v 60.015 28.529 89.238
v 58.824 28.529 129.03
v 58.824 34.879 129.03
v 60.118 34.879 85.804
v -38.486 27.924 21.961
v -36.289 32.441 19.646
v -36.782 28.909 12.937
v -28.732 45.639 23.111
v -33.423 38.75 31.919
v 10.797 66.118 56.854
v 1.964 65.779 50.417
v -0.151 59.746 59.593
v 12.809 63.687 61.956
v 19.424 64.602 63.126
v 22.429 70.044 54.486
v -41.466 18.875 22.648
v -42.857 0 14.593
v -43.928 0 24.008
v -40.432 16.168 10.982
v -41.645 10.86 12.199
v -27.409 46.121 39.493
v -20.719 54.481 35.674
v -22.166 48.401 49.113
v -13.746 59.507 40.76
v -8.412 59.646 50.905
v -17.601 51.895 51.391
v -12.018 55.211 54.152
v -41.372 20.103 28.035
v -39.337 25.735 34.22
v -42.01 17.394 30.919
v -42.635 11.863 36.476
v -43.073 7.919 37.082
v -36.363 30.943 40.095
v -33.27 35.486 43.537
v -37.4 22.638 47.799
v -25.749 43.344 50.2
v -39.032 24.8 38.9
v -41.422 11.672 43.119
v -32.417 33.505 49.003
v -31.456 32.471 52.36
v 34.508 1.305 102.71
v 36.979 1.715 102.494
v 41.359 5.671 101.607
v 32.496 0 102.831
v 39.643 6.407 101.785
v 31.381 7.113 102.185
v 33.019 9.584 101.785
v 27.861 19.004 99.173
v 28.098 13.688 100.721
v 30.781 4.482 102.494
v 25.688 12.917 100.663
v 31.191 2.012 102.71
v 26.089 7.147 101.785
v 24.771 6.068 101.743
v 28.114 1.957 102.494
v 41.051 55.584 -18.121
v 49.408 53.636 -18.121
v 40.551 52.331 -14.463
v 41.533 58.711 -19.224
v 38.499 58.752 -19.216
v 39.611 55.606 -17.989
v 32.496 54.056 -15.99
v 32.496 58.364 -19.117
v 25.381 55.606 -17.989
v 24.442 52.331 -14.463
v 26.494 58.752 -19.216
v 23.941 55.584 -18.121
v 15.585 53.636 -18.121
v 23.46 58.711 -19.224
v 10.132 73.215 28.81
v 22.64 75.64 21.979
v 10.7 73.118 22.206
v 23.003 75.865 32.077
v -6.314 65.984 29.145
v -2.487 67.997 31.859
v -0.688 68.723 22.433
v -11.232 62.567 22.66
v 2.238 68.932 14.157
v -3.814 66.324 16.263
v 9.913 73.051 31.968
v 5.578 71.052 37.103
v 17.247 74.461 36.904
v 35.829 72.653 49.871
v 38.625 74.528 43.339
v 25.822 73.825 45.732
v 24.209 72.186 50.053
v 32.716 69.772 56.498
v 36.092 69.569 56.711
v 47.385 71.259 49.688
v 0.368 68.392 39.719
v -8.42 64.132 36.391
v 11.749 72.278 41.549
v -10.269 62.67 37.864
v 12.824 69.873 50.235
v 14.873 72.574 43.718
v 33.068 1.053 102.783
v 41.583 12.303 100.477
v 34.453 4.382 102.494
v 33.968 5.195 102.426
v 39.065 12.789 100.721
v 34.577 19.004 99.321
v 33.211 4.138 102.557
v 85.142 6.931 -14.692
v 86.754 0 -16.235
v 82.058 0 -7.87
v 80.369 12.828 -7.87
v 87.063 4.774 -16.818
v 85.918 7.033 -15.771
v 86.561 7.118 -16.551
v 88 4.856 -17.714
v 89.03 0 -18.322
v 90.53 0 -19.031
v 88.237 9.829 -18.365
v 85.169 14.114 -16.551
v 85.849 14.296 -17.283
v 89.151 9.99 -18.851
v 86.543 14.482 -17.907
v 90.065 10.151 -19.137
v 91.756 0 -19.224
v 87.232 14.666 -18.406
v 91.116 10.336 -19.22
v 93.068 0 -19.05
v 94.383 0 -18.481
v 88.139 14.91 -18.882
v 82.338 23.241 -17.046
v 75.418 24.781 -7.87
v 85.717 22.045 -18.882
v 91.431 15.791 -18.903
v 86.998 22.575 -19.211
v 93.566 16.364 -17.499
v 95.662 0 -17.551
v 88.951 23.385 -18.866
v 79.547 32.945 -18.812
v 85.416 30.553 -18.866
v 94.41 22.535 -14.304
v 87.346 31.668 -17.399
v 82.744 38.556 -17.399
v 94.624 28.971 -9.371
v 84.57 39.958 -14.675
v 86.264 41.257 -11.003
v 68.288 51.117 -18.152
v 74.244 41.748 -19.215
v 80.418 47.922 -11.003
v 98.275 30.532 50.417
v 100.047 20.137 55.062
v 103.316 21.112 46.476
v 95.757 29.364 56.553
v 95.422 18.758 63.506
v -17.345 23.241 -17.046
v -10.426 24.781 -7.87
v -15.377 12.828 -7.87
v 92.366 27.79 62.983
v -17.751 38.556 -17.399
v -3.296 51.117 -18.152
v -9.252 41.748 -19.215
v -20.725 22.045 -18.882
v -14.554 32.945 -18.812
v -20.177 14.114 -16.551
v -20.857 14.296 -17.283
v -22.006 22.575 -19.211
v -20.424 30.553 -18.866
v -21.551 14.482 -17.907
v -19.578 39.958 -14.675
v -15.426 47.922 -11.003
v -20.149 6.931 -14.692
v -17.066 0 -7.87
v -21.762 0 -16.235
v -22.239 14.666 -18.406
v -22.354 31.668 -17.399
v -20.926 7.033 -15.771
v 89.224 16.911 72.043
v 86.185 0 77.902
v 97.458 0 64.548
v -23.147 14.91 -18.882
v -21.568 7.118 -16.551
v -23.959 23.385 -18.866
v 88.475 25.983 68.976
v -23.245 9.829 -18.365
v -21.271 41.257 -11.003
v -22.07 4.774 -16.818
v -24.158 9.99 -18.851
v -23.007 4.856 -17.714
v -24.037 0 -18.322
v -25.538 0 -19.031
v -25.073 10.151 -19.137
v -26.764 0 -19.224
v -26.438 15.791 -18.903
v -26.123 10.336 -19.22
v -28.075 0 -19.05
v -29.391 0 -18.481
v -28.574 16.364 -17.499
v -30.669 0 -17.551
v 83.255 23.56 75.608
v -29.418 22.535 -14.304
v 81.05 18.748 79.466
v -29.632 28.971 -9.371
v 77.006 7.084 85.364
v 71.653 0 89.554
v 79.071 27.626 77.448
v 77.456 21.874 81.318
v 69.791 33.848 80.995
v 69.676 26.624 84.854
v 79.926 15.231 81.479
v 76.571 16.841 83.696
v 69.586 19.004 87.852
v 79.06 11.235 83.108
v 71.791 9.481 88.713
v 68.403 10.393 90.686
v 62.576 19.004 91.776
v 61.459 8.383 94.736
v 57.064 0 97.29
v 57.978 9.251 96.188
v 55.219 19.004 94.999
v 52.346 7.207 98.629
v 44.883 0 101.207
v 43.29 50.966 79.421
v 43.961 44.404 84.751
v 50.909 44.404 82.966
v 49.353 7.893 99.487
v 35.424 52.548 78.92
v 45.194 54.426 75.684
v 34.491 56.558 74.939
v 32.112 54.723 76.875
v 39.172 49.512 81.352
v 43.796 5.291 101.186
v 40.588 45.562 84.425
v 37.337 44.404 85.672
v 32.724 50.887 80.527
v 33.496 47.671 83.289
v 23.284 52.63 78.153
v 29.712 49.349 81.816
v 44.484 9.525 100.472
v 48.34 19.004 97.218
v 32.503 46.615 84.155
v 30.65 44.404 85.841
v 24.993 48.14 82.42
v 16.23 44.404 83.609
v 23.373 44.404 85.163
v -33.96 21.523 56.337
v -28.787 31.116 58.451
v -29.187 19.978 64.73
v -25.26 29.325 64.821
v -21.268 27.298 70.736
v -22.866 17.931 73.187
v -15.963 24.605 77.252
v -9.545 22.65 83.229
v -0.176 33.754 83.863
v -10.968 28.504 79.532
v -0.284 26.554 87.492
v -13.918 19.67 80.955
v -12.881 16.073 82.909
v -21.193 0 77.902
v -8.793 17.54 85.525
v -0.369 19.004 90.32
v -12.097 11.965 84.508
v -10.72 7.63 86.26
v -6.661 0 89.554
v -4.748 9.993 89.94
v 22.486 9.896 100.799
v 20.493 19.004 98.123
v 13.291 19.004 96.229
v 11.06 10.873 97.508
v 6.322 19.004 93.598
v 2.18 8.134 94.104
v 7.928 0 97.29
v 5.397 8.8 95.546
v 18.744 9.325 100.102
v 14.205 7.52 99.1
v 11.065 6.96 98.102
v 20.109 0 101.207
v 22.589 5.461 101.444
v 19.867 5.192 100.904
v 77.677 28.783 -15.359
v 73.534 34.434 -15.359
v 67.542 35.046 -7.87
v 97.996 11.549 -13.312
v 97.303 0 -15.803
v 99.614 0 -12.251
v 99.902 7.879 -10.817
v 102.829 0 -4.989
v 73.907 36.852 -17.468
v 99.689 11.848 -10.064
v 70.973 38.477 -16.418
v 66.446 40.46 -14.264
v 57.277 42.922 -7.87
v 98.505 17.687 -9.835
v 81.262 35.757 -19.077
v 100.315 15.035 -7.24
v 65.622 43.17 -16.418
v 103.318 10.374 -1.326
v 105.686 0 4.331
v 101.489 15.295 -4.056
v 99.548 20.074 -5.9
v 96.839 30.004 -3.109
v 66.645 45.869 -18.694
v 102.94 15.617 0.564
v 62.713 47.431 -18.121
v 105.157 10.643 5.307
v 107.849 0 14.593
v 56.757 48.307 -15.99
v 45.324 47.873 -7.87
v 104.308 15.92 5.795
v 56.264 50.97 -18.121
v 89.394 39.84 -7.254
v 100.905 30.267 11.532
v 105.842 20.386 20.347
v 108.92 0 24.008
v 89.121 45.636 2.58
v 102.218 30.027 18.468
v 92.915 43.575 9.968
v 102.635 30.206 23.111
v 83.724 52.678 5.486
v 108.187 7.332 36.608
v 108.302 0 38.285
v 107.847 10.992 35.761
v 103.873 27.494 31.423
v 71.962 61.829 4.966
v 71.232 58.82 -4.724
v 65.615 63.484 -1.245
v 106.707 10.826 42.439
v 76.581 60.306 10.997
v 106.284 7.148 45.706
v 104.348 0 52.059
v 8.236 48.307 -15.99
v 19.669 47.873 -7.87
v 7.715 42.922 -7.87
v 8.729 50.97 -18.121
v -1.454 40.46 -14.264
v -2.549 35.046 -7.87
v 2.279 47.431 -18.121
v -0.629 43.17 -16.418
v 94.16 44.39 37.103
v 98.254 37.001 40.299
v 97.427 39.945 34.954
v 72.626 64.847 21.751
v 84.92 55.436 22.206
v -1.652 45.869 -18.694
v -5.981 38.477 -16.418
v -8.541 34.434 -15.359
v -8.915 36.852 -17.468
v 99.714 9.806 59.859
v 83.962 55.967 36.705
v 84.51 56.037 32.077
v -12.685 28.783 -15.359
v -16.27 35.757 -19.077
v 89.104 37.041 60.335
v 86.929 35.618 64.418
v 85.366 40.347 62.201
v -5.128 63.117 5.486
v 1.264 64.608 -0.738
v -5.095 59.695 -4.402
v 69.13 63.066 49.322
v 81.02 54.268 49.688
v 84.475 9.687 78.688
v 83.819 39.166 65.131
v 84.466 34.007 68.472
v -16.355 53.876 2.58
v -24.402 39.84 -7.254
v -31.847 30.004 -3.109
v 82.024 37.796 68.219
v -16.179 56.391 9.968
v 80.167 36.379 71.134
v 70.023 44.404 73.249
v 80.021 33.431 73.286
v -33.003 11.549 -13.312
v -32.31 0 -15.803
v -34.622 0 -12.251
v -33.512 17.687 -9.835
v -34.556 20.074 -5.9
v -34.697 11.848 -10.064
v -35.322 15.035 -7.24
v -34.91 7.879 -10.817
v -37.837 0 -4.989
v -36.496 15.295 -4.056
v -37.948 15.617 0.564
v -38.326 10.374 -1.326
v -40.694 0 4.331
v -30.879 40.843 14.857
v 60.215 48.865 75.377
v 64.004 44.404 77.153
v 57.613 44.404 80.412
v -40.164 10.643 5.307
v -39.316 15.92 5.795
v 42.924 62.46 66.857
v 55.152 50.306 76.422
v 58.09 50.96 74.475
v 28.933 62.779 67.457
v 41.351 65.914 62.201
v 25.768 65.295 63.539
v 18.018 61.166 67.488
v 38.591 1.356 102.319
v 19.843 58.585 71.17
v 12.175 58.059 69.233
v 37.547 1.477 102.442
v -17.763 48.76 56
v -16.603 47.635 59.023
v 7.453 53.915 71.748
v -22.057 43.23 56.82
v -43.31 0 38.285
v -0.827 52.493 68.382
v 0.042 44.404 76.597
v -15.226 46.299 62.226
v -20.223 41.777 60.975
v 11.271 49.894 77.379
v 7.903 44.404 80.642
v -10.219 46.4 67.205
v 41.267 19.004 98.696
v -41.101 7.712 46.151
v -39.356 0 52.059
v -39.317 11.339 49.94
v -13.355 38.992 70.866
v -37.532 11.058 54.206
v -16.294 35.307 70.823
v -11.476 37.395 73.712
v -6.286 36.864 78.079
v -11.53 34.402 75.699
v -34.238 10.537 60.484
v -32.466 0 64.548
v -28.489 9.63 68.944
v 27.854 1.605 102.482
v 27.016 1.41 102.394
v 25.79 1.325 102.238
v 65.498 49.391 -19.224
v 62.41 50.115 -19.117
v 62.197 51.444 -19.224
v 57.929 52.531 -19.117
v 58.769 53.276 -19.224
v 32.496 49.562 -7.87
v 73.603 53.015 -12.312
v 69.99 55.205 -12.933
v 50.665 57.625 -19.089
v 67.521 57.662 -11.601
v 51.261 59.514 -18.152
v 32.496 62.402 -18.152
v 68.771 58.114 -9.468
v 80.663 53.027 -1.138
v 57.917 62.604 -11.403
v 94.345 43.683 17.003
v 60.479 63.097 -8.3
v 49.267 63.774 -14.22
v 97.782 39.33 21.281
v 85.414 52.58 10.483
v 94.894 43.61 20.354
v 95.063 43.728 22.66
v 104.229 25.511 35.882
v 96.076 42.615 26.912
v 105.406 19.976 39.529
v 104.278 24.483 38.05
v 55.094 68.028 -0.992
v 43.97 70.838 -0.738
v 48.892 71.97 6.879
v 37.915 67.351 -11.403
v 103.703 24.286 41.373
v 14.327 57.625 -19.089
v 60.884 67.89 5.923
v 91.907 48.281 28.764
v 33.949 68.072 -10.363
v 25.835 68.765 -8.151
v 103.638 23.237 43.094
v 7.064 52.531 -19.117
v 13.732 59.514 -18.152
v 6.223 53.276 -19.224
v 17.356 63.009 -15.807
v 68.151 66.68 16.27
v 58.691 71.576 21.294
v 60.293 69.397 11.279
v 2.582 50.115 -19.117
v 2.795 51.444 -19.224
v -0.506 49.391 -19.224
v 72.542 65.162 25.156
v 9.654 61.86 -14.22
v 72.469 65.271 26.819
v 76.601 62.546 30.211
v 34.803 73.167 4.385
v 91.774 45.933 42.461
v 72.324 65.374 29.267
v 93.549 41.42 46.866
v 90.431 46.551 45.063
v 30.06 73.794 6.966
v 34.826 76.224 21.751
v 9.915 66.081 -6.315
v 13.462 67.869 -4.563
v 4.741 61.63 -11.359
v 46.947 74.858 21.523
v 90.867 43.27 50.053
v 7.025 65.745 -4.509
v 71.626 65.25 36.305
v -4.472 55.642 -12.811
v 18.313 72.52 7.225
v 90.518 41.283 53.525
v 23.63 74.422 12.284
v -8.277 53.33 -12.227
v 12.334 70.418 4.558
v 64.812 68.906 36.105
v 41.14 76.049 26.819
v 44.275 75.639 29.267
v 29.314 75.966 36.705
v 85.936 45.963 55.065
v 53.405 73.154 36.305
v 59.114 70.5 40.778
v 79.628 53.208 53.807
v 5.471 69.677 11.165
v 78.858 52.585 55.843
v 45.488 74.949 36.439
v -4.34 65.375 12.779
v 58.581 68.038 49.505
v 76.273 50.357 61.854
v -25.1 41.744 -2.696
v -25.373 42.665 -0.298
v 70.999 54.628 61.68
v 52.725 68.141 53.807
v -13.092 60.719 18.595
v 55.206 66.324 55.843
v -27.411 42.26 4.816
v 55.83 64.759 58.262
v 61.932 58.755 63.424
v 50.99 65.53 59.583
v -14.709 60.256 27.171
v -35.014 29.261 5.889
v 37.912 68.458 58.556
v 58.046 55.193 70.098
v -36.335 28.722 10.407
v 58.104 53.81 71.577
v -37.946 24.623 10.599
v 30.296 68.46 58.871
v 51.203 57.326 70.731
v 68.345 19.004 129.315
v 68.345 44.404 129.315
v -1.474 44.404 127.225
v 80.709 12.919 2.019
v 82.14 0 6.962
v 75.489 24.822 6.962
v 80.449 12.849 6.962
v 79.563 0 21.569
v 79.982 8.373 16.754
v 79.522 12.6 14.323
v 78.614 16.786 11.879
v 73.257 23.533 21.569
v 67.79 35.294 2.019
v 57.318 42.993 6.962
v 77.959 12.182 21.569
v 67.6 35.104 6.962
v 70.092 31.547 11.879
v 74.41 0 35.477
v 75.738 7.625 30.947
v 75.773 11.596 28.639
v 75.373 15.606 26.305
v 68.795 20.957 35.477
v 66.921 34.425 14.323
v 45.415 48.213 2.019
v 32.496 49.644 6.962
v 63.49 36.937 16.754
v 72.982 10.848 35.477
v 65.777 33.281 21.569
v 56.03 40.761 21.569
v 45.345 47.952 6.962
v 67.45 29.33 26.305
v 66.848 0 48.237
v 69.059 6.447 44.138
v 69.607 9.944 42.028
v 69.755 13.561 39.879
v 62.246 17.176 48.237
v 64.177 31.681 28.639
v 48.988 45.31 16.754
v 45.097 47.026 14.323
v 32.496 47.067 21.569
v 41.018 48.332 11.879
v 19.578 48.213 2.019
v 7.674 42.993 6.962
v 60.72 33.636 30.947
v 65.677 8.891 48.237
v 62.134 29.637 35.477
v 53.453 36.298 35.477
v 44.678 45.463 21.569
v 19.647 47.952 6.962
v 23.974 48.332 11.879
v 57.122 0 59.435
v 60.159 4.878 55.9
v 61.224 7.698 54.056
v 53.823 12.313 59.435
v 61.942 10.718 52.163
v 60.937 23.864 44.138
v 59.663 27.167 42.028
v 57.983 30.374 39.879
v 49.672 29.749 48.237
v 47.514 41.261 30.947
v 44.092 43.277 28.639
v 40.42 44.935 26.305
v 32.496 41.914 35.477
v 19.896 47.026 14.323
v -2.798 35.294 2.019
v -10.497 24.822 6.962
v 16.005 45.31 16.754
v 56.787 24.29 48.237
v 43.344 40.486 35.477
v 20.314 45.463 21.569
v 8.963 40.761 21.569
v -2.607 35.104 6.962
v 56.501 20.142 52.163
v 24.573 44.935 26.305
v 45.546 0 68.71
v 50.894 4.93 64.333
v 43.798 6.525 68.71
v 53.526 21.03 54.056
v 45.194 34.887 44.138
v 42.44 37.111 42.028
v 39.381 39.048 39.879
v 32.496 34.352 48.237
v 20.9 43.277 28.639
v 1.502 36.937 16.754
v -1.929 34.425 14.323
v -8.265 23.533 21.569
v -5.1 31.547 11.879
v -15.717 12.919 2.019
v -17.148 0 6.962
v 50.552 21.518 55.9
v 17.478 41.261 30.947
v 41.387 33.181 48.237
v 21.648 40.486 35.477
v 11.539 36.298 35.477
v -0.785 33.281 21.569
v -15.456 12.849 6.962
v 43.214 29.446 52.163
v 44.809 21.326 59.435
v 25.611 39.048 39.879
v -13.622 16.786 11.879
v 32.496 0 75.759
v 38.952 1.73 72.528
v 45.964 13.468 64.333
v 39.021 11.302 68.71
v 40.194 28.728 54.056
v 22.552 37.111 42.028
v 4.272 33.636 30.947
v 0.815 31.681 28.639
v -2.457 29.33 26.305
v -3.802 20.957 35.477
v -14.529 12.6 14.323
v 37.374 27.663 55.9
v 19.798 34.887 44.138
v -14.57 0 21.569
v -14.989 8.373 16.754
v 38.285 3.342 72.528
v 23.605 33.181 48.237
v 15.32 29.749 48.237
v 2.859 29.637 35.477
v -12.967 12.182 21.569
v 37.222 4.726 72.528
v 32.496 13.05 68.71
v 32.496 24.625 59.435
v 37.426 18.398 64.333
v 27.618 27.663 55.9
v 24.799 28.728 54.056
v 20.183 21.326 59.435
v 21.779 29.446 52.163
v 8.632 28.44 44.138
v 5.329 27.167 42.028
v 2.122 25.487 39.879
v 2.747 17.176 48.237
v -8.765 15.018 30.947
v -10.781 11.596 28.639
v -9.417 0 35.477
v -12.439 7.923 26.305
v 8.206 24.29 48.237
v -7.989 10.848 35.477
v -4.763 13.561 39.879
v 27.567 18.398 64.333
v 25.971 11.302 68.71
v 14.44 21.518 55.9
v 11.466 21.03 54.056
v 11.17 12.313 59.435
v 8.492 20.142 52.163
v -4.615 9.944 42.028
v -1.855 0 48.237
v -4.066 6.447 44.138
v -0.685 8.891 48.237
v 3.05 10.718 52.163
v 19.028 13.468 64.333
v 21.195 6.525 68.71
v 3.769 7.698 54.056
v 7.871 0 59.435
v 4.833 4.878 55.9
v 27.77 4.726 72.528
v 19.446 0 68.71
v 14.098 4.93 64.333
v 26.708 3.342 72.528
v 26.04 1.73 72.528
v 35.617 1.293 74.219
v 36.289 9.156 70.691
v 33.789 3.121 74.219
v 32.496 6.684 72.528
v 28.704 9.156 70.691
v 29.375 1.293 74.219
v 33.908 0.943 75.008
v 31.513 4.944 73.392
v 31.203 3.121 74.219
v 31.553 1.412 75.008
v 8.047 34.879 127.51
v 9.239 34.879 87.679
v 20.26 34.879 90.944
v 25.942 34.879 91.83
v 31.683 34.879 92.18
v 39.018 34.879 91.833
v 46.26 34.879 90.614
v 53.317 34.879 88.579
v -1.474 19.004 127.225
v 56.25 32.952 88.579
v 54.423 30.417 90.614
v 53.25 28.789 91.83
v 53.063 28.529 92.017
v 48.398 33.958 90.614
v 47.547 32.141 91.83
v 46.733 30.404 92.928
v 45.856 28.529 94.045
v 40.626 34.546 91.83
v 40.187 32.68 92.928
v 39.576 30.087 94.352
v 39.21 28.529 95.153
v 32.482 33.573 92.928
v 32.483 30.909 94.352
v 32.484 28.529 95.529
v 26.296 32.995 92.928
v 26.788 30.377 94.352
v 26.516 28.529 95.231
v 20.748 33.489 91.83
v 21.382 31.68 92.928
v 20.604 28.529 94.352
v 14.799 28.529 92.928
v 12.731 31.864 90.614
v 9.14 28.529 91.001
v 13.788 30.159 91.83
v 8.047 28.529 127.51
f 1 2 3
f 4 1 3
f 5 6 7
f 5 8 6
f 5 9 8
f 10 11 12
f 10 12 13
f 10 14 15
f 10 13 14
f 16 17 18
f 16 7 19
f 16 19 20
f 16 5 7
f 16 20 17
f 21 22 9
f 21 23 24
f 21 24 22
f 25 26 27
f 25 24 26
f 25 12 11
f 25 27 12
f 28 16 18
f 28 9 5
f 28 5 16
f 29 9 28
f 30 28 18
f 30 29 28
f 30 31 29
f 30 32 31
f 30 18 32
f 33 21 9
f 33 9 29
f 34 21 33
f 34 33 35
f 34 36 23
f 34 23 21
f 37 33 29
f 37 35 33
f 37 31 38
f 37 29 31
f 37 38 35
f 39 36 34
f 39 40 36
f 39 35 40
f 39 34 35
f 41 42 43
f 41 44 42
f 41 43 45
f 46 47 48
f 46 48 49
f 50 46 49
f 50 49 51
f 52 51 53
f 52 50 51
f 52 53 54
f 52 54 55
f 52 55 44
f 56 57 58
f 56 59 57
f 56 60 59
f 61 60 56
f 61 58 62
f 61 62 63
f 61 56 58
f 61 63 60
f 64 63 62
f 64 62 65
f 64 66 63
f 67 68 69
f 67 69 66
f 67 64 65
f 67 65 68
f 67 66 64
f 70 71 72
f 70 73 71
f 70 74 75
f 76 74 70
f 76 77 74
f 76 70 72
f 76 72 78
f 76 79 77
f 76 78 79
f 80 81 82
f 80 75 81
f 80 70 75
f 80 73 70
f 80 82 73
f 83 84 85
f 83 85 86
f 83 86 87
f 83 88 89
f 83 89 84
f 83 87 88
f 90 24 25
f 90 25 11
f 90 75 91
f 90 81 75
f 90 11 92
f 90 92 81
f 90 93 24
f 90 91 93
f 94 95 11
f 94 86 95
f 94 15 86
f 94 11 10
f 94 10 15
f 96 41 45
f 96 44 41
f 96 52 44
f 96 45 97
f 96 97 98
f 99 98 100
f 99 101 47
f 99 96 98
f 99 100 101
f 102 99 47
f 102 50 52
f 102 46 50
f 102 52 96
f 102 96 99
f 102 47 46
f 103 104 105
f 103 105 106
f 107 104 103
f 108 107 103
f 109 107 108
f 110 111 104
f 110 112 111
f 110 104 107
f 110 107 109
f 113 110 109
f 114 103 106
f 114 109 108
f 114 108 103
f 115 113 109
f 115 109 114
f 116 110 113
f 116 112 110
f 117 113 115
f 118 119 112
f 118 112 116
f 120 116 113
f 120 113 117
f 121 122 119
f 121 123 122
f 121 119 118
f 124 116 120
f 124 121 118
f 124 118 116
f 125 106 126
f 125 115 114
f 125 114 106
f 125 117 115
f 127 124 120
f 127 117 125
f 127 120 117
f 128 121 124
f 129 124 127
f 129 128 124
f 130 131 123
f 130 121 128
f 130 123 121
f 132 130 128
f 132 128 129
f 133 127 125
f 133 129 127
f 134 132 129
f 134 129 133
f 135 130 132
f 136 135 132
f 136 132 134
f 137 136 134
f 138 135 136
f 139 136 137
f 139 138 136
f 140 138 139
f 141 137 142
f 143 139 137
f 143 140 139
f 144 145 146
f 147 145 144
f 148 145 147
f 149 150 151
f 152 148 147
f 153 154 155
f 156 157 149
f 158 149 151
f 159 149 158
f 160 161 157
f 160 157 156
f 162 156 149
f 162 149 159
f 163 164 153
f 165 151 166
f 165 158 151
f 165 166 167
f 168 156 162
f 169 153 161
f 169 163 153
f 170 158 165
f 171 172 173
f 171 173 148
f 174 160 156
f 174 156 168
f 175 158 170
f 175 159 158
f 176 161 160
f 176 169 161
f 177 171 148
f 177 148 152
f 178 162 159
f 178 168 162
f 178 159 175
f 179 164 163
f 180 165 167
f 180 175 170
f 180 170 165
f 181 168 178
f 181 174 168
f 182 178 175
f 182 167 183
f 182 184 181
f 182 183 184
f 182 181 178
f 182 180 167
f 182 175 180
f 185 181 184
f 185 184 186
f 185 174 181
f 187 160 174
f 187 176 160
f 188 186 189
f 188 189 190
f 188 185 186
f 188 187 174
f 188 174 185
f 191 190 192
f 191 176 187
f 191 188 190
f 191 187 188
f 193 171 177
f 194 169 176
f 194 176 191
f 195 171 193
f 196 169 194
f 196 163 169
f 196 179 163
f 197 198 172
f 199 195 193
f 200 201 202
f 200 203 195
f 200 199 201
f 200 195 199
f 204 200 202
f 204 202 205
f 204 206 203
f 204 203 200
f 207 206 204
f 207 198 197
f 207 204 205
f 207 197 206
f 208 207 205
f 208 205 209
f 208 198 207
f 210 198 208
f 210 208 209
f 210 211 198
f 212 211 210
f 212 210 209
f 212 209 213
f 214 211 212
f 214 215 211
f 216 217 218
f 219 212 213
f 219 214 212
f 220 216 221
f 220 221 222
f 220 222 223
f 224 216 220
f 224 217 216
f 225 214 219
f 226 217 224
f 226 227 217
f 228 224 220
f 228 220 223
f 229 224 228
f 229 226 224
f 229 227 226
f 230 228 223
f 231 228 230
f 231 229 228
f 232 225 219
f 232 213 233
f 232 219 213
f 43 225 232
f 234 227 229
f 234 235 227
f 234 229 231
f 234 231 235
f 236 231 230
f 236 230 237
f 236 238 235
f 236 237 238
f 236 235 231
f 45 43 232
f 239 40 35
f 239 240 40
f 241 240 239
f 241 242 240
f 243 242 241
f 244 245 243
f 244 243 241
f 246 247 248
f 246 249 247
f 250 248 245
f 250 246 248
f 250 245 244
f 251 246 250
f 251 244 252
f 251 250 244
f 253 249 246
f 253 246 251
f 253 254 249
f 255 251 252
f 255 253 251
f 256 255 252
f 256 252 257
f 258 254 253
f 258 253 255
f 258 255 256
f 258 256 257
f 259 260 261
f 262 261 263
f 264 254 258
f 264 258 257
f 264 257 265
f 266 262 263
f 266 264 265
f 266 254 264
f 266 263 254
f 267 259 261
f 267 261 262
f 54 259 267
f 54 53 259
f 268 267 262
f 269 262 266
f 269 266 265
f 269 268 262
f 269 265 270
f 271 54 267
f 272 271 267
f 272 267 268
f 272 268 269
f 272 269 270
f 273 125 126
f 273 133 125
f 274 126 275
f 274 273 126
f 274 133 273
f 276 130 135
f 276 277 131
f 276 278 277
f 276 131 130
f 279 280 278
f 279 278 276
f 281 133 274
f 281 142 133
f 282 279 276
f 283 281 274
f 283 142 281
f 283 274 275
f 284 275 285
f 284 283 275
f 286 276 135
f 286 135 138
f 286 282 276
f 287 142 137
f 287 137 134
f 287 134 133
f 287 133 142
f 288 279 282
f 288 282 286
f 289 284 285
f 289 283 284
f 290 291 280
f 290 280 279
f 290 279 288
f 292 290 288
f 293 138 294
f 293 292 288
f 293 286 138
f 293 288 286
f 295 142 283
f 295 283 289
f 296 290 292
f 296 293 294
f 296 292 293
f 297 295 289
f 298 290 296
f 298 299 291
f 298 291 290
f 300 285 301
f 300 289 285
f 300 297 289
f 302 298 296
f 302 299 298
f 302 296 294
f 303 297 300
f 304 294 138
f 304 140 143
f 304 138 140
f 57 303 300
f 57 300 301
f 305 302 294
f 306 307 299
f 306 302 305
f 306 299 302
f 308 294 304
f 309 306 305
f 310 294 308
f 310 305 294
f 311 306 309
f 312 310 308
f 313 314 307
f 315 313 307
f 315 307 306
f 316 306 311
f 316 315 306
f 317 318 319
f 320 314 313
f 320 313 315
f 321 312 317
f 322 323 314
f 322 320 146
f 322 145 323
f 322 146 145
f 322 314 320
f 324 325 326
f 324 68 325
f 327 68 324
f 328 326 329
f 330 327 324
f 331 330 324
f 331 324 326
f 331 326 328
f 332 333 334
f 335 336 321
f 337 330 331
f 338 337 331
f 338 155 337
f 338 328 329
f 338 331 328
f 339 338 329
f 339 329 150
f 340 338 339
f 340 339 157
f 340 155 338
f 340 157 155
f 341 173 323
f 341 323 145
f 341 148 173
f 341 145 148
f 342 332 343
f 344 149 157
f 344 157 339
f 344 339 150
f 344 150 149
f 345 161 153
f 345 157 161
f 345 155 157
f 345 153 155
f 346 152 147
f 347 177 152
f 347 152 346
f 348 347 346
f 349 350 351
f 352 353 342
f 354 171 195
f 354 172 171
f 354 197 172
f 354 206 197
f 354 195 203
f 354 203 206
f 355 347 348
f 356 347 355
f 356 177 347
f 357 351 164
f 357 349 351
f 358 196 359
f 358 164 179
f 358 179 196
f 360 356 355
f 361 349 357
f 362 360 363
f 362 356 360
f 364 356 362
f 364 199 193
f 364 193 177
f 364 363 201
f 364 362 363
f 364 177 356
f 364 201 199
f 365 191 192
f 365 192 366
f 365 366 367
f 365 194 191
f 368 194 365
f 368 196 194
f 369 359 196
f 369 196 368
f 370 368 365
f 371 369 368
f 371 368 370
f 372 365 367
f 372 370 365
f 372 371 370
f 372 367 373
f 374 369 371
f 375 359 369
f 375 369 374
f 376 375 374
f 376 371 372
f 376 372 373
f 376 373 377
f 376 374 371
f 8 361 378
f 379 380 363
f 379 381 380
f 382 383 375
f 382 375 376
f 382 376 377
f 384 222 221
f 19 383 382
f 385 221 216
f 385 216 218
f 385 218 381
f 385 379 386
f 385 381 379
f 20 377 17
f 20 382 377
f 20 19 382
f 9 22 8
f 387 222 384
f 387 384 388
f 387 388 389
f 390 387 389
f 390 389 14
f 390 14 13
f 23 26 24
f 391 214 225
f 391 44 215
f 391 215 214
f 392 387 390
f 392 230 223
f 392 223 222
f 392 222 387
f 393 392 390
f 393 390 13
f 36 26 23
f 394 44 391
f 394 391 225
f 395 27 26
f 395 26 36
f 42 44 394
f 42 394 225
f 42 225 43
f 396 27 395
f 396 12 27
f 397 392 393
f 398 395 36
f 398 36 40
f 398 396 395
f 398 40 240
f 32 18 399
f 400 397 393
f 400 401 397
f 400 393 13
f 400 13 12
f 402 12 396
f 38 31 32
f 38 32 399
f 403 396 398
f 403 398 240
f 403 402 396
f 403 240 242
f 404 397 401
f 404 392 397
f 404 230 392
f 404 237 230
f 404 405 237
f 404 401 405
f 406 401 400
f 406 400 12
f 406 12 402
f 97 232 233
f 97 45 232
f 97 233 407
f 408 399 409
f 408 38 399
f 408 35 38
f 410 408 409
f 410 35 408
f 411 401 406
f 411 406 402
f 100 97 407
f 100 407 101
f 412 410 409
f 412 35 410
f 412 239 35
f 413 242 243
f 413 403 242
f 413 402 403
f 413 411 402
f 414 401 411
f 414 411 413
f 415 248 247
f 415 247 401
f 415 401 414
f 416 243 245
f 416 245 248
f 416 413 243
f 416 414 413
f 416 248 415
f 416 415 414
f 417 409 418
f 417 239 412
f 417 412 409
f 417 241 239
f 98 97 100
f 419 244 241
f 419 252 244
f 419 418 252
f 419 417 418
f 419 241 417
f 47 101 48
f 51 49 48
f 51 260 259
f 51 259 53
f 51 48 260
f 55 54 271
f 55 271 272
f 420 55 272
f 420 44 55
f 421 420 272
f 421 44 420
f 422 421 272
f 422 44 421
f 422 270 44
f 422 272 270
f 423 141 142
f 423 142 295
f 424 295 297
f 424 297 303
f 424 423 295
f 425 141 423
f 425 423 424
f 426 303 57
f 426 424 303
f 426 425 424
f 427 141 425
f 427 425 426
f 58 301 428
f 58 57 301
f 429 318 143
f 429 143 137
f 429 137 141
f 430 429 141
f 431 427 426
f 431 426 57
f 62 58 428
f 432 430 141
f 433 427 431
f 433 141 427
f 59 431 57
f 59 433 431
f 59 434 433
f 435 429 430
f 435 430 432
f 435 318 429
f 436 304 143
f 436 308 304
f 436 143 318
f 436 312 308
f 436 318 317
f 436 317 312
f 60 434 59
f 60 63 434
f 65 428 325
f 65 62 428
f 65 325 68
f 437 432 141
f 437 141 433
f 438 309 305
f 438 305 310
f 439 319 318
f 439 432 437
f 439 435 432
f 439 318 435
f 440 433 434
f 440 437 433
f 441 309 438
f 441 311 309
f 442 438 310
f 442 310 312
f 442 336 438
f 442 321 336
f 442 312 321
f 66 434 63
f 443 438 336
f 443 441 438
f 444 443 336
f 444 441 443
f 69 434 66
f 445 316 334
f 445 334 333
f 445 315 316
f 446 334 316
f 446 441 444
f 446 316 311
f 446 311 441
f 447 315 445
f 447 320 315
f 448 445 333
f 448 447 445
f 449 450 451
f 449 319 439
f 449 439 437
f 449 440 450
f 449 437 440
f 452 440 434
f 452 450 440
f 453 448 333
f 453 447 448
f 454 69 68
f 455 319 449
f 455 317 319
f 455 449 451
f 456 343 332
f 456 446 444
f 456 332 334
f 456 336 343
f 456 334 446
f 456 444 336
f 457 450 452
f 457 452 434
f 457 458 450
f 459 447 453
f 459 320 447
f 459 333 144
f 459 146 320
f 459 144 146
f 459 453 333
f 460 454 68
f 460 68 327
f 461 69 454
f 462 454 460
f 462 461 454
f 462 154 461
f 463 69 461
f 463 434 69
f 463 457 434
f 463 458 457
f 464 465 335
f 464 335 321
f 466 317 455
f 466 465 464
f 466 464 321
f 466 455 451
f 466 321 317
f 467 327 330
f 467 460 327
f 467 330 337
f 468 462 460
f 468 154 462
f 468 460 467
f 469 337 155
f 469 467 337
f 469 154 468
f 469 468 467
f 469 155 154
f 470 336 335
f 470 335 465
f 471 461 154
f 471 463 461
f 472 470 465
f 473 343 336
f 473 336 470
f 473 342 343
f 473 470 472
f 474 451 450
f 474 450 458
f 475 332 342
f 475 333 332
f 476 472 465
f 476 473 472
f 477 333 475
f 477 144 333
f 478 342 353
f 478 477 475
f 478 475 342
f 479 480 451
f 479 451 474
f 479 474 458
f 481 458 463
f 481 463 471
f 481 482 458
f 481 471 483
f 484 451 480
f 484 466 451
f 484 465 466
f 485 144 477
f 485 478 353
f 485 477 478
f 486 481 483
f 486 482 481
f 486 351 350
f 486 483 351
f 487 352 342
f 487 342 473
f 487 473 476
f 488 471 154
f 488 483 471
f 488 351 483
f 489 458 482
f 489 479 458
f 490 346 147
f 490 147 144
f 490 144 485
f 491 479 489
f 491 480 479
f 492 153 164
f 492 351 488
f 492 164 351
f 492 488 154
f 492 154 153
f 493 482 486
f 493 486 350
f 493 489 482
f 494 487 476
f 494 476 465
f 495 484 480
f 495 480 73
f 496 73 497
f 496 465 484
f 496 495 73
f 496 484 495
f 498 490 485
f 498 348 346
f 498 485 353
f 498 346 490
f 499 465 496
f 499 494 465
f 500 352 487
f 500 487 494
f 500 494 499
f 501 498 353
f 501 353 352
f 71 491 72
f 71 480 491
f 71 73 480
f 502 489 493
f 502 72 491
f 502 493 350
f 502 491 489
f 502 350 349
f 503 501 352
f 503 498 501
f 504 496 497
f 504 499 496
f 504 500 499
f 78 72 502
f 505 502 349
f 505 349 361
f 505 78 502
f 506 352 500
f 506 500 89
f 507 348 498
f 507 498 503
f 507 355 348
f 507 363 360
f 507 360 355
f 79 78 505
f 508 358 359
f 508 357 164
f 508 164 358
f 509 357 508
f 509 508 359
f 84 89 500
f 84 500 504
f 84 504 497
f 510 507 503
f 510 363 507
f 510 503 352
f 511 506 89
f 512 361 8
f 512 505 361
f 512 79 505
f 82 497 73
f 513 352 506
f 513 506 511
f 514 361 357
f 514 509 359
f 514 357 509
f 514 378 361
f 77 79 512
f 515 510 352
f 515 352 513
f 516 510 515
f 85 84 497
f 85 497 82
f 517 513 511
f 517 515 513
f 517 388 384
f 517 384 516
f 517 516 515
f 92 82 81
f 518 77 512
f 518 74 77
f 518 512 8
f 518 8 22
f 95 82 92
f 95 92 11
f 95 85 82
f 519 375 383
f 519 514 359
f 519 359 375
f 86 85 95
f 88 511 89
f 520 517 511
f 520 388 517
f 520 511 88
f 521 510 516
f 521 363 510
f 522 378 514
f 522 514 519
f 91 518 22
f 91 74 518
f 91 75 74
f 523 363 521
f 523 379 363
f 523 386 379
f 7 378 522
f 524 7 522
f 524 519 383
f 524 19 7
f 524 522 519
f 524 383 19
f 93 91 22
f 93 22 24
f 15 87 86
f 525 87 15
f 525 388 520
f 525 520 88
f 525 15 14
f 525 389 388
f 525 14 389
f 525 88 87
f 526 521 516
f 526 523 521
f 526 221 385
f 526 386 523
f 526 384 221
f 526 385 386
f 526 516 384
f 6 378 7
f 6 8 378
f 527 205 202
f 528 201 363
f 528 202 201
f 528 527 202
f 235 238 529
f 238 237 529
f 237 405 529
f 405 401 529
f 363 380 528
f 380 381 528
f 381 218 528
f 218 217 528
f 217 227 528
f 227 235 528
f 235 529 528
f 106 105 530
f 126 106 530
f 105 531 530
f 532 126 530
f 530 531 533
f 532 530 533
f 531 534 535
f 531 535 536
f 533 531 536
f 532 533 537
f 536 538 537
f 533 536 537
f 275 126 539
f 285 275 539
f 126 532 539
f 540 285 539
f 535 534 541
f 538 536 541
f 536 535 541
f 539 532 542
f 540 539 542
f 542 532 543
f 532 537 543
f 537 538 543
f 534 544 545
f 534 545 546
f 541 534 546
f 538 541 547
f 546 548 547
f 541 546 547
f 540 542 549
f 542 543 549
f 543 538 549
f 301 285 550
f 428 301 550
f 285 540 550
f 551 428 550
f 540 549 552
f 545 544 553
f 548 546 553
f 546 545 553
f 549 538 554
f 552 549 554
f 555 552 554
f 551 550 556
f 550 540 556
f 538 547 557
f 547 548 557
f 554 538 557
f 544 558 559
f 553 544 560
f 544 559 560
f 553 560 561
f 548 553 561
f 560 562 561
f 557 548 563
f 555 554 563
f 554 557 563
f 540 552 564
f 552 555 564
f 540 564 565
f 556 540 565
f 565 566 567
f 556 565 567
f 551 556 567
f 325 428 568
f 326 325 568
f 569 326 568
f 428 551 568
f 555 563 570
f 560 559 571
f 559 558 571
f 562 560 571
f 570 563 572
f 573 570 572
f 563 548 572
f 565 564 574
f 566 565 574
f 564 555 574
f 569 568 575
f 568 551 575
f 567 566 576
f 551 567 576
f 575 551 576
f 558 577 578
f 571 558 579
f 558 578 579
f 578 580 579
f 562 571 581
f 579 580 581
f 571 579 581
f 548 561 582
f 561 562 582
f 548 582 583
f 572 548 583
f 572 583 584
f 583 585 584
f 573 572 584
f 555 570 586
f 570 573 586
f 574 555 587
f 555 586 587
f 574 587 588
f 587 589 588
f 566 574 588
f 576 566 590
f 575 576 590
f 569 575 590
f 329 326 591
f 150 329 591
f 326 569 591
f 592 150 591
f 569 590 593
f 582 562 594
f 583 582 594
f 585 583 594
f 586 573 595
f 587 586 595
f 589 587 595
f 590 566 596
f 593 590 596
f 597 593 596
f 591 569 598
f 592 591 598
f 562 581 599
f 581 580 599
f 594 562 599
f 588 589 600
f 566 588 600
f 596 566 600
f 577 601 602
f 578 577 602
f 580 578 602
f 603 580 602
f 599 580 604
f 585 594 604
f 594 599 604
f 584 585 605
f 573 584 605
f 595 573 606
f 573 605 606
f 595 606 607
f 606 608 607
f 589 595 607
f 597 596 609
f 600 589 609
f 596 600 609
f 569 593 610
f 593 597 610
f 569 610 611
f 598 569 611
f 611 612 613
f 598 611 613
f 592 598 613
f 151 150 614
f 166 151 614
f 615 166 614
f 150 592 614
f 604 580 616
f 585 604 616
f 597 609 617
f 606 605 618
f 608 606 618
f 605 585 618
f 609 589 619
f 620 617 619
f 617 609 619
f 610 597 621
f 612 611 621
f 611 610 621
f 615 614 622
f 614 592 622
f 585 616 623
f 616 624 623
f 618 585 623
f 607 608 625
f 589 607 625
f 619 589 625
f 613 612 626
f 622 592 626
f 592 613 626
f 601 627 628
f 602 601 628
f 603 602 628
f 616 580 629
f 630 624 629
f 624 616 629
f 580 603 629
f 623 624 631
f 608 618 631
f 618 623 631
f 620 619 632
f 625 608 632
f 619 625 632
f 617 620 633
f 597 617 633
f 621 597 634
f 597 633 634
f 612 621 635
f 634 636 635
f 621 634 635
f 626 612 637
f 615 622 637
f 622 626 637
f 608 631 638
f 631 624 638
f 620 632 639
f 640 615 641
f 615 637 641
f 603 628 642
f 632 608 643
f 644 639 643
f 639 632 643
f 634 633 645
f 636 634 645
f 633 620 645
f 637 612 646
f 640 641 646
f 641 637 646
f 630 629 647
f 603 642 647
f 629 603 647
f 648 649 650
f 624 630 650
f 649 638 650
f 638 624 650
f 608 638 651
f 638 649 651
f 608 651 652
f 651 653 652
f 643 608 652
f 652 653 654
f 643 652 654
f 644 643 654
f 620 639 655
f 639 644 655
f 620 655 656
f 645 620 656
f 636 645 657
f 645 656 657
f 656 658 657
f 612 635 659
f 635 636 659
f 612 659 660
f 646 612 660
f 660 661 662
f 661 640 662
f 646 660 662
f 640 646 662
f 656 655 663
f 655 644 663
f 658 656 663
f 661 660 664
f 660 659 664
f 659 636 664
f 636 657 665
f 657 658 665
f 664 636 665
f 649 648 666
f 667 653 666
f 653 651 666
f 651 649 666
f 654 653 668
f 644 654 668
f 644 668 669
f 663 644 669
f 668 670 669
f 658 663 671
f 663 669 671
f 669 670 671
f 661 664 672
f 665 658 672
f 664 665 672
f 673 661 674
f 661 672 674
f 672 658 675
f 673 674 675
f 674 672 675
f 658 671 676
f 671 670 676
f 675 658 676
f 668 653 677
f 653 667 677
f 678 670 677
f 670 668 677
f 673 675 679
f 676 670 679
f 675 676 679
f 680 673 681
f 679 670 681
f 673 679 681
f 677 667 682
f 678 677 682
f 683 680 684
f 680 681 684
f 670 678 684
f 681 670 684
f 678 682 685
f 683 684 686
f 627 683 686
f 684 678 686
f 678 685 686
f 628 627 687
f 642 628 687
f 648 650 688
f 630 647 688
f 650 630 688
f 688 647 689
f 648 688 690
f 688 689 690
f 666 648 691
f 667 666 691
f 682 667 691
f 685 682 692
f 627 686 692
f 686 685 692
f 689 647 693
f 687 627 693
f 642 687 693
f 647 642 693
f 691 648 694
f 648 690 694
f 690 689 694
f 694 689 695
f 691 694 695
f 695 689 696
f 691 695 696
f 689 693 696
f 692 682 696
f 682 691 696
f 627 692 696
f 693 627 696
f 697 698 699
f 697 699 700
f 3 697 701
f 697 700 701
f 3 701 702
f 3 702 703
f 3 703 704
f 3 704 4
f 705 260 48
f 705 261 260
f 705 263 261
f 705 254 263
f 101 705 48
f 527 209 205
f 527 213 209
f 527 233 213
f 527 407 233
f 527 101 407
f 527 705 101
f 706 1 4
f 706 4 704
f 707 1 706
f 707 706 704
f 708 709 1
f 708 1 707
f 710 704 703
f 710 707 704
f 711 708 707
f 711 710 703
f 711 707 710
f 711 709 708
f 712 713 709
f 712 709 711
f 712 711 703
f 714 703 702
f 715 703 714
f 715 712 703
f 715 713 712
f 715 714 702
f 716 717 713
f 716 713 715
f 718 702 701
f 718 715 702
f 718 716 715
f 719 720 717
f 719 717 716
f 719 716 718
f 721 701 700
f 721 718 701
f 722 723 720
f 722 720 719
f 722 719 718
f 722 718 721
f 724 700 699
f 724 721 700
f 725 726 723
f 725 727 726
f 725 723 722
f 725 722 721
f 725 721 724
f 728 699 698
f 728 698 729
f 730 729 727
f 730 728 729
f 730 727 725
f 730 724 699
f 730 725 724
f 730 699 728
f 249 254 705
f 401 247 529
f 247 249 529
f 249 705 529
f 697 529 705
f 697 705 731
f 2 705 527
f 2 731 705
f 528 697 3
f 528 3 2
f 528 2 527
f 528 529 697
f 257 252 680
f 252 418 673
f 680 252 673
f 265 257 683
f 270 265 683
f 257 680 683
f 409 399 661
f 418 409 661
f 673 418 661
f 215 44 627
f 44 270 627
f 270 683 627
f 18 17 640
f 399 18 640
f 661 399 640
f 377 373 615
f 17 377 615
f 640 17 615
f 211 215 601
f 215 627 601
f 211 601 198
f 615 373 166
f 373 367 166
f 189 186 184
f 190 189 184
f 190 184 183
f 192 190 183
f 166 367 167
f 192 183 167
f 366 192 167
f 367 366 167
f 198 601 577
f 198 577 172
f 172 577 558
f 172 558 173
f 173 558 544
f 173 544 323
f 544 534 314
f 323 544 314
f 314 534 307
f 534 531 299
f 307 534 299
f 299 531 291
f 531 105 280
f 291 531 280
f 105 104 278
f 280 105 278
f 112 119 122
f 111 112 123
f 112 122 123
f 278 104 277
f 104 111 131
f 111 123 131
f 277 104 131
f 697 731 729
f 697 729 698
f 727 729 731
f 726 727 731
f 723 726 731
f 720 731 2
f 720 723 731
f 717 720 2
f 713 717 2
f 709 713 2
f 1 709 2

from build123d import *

# Parameters (mm, degrees)
REVOLVE1_ANGLE           = 180
SKETCH3_W                = 69.85
SKETCH3_H                = 25.4
SKETCH3_W_2              = 50.8
SKETCH3_H_2              = 6.35
BOSS_EXTRUDE7_DEPTH      = 25.4
BOSS_EXTRUDE7_DEPTH_BACK = 38.1


with BuildPart() as part:
    # Sketch2 → Revolve1 (revolve)
    with BuildSketch(Plane(origin=(0, 0, 0), x_dir=(1, 0, 0), z_dir=(0, 1, 0))):
        with BuildLine():
            Line((32.496202247, -75.759218491), (32.496202247, -102.830579492))
            add(Edge.make_bspline(
                [(82.058028303, 7.870345482), (93.041481389, 34.162455024), (112.348086196, -13.725828539), (106.284293116, -68.651897164), (61.355001648, -101.966794635), (32.496202247, -102.830579492)],
                knots=[0, 0, 0, 0, 0.26758911, 0.512711999, 1, 1, 1, 1], degree=3))
            ThreePointArc((82.058028303, 7.870345482), (70.916457376, -42.027591177), (32.496202247, -75.759218491))
        make_face()
    revolve(axis=Axis((32.496202247, 0, 75.759218491), (0, 0, 1)), revolution_arc=REVOLVE1_ANGLE)

    # Sketch3 → Boss-Extrude7 (add, two sides)
    with BuildSketch(Plane(origin=(32.496202247, 0, 102.830579492), x_dir=(0.999552356, 0, 0.029918022), z_dir=(-0.029918022, 0, 0.999552356))) as boss_extrude7_sk:
        with Locations((1.700295248, 31.70443969)):
            Rectangle(SKETCH3_W, SKETCH3_H)
        with Locations((1.700295248, 31.70443969)):
            Rectangle(SKETCH3_W_2, SKETCH3_H_2, mode=Mode.SUBTRACT)
    extrude(amount=BOSS_EXTRUDE7_DEPTH)
    extrude(boss_extrude7_sk.sketch, amount=-BOSS_EXTRUDE7_DEPTH_BACK)


solid = part.part
